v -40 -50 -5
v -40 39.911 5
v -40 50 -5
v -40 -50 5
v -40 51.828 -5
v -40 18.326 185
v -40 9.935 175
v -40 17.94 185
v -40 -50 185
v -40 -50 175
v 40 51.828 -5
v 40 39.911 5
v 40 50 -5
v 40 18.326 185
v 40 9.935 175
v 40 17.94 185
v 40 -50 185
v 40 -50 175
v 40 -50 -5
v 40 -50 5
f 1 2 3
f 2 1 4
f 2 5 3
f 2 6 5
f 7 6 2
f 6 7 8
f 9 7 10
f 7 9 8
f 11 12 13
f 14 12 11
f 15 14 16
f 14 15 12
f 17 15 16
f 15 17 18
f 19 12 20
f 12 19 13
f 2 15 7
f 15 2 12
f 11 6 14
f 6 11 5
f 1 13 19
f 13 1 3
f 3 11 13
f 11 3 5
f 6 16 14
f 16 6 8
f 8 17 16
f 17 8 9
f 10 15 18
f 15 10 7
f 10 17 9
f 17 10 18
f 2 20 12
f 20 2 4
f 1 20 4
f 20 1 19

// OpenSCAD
//Parametric Headphone Stand

//Footprint width in mm
w=80;

//Footprint depth in mm
d=100;

//Thickness of stand in mm, minimum of 7mm
t=10;

//Height of stand in mm
h=200;

union(){

difference(){
    translate([0,d/2-t*2,h/2-t])rotate([10,0,0])cube([w,t,h],center=true);
    translate([0,t,-t])cube([w*2,2*d,t],center=true);
    translate([0,-d/4+t/2,h-t])cube([w*2,2*d,t],center=true);
}
difference(){
    translate([0,0,h-t*2])cube([w,d,t],center=true);
    translate([0,d/2+t/2,h/2-t])rotate([10,0,0])cube([2*w,4*t,h*2],center=true);
}
difference(){
    cube([w,d,t],center=true);
    translate([0,d/2+t/2,h/2-t])rotate([10,0,0])cube([2*w,4*t,h*2],center=true);
}
}
